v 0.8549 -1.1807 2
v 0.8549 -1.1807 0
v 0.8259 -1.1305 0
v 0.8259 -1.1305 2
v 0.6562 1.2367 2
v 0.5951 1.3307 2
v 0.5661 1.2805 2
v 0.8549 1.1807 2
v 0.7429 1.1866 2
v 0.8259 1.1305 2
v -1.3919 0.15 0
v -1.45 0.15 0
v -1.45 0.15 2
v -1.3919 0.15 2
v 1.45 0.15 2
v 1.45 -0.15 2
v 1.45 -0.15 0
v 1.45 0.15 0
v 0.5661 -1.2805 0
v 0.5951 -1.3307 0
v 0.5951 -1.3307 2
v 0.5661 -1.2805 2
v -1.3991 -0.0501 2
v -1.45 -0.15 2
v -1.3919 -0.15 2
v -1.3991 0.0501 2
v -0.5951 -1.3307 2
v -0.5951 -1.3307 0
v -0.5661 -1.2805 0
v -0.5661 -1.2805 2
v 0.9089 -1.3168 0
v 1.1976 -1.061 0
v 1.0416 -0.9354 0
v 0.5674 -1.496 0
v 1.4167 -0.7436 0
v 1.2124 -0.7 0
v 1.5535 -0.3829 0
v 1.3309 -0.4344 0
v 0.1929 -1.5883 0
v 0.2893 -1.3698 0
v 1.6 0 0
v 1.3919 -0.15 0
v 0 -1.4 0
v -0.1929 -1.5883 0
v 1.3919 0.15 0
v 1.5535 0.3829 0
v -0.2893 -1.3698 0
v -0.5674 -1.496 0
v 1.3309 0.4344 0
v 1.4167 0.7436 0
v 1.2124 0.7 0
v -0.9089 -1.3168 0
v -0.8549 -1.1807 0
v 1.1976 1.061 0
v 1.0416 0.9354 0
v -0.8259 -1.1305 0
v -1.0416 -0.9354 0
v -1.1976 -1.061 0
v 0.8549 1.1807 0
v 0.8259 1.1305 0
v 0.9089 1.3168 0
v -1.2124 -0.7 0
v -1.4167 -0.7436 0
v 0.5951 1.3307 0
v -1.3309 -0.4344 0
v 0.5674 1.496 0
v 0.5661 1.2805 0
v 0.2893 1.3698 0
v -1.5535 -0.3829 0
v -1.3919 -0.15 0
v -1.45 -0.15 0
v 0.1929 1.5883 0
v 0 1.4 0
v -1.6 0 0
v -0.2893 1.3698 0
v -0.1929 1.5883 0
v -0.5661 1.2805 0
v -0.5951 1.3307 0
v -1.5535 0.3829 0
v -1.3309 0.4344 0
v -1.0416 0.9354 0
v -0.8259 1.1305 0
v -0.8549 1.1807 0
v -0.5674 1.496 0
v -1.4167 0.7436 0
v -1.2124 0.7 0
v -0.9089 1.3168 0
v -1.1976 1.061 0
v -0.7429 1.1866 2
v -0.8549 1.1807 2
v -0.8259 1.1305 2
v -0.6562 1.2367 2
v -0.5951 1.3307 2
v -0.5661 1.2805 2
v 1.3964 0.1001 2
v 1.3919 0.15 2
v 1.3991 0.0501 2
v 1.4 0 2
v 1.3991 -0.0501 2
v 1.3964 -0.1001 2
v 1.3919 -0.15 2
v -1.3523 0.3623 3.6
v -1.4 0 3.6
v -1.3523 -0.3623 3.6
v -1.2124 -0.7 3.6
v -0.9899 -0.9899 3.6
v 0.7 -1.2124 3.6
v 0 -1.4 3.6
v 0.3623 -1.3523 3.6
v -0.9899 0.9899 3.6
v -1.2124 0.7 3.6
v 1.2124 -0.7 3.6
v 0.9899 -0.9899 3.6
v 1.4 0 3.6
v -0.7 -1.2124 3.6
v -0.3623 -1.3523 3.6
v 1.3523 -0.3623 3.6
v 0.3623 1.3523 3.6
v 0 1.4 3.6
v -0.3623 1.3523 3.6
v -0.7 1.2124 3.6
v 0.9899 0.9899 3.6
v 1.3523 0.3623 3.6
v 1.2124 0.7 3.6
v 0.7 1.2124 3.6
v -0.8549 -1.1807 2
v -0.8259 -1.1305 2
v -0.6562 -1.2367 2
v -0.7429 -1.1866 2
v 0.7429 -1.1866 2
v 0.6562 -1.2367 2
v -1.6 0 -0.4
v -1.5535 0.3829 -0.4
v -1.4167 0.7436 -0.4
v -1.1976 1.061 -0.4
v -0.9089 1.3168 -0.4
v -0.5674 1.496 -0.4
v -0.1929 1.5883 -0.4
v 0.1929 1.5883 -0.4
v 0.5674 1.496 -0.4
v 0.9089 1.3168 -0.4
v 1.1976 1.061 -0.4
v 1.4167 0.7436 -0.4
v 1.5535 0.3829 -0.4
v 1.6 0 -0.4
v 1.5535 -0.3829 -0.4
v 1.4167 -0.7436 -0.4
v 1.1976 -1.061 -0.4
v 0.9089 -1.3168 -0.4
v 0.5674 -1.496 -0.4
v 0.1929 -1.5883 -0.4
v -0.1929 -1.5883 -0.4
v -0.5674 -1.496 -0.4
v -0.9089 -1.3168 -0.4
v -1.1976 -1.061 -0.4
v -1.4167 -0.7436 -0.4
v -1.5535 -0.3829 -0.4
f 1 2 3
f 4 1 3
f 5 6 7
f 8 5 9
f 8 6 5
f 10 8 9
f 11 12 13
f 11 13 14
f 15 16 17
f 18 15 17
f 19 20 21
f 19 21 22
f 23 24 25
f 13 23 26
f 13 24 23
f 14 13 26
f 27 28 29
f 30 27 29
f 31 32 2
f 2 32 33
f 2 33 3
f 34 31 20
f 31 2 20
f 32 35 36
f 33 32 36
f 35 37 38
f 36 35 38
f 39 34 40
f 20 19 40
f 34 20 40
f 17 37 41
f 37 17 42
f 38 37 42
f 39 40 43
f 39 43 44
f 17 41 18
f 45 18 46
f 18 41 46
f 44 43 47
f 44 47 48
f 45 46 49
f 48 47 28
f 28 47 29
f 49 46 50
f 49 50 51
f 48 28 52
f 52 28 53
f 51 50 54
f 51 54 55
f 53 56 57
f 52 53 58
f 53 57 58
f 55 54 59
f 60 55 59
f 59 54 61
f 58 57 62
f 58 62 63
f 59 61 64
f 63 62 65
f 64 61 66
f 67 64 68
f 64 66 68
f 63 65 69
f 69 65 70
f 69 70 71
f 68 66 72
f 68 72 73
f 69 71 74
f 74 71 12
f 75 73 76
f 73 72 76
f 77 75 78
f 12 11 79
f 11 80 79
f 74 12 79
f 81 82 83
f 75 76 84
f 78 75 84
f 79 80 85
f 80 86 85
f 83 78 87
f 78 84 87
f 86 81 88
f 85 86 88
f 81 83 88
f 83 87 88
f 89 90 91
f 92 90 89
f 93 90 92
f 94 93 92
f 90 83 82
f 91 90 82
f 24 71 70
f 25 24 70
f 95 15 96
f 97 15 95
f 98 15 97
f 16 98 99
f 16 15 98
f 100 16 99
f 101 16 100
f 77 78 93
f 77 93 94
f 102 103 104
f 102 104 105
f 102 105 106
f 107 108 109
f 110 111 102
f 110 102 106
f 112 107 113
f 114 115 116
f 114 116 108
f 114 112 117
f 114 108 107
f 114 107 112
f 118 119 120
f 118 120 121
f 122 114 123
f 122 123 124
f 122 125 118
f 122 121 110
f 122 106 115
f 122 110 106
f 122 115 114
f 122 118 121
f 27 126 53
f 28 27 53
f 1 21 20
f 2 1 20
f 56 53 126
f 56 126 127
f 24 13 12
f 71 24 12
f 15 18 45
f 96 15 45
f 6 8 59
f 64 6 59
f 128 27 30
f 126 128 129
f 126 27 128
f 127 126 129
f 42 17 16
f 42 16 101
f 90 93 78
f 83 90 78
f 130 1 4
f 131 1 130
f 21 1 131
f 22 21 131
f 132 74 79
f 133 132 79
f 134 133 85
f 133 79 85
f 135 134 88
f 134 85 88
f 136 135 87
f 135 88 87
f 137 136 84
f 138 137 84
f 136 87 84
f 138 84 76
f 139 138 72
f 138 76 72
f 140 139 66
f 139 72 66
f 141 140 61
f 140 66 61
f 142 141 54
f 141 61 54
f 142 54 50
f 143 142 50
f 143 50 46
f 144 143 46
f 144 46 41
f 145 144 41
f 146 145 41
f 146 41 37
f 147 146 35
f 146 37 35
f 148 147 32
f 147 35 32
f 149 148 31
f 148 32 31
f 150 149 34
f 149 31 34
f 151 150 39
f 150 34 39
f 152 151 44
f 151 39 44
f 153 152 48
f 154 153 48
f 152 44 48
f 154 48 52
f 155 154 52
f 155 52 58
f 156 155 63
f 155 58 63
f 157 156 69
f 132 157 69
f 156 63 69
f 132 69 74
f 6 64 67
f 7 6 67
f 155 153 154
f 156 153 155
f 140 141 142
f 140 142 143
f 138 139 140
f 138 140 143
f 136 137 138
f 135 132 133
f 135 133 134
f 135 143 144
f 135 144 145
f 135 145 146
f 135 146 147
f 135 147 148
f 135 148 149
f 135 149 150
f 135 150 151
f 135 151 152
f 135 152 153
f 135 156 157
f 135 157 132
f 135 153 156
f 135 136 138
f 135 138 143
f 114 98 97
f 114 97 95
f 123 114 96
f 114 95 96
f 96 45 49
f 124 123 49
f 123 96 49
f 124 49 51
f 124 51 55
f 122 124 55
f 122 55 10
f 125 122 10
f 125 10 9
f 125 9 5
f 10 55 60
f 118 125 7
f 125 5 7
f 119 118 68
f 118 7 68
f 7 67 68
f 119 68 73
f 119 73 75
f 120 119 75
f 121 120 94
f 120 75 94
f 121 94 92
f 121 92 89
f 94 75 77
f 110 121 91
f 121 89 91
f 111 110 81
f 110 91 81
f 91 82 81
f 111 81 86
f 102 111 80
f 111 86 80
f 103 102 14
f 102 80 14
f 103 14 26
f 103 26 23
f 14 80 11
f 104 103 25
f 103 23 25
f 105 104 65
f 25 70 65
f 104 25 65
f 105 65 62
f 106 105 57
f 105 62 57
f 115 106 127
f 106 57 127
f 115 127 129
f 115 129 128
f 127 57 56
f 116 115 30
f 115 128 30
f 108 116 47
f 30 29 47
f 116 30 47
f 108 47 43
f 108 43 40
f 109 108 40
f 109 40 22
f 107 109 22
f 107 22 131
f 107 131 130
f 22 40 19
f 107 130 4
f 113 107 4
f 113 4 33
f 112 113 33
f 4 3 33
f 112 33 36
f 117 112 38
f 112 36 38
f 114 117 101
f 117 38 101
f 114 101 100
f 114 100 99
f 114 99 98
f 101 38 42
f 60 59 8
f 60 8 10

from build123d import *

# Parameters (mm, degrees)
SKETCH_1_R               = 1.4
EXTRUDE_1_DEPTH          = 3.6
SKETCH_2_R               = 1.6
EXTRUDE_2_DEPTH          = 0.4
SKETCH_3_W               = 0.120106516
SKETCH_3_H               = 2
EXTRUDE_3_DEPTH          = 0.15
PATTERN_CIRCULAR_1_COUNT = 6


with BuildPart() as part:
    # 草图1 → 凸台-拉伸1 (new body)
    with BuildSketch(Plane.XY):
        Circle(SKETCH_1_R)
    extrude(amount=EXTRUDE_1_DEPTH)

    # 草图2 → 凸台-拉伸2 (add)
    with BuildSketch(Plane(origin=(0, 0, 0), x_dir=(-1, 0, 0), z_dir=(0, 0, -1))):
        Circle(SKETCH_2_R)
    extrude(amount=EXTRUDE_2_DEPTH)

    # 草图3 → 凸台-拉伸3 (add, symmetric)
    with BuildSketch(Plane(origin=(0, 0, 0), x_dir=(1, 0, 0), z_dir=(0, 1, 0))):
        with Locations((-1.389946742, -1)):
            Rectangle(SKETCH_3_W, SKETCH_3_H)
    extrude_3 = extrude(amount=EXTRUDE_3_DEPTH, both=True)

    # 阵列(圆周)1: 凸台-拉伸3 ×6 about axis
    pattern_circular_1_axis = Axis((0, 0, 0), (0, 0, 1))
    for i in range(1, PATTERN_CIRCULAR_1_COUNT):
        add(extrude_3.rotate(pattern_circular_1_axis, i * 360 / PATTERN_CIRCULAR_1_COUNT))


solid = part.part
